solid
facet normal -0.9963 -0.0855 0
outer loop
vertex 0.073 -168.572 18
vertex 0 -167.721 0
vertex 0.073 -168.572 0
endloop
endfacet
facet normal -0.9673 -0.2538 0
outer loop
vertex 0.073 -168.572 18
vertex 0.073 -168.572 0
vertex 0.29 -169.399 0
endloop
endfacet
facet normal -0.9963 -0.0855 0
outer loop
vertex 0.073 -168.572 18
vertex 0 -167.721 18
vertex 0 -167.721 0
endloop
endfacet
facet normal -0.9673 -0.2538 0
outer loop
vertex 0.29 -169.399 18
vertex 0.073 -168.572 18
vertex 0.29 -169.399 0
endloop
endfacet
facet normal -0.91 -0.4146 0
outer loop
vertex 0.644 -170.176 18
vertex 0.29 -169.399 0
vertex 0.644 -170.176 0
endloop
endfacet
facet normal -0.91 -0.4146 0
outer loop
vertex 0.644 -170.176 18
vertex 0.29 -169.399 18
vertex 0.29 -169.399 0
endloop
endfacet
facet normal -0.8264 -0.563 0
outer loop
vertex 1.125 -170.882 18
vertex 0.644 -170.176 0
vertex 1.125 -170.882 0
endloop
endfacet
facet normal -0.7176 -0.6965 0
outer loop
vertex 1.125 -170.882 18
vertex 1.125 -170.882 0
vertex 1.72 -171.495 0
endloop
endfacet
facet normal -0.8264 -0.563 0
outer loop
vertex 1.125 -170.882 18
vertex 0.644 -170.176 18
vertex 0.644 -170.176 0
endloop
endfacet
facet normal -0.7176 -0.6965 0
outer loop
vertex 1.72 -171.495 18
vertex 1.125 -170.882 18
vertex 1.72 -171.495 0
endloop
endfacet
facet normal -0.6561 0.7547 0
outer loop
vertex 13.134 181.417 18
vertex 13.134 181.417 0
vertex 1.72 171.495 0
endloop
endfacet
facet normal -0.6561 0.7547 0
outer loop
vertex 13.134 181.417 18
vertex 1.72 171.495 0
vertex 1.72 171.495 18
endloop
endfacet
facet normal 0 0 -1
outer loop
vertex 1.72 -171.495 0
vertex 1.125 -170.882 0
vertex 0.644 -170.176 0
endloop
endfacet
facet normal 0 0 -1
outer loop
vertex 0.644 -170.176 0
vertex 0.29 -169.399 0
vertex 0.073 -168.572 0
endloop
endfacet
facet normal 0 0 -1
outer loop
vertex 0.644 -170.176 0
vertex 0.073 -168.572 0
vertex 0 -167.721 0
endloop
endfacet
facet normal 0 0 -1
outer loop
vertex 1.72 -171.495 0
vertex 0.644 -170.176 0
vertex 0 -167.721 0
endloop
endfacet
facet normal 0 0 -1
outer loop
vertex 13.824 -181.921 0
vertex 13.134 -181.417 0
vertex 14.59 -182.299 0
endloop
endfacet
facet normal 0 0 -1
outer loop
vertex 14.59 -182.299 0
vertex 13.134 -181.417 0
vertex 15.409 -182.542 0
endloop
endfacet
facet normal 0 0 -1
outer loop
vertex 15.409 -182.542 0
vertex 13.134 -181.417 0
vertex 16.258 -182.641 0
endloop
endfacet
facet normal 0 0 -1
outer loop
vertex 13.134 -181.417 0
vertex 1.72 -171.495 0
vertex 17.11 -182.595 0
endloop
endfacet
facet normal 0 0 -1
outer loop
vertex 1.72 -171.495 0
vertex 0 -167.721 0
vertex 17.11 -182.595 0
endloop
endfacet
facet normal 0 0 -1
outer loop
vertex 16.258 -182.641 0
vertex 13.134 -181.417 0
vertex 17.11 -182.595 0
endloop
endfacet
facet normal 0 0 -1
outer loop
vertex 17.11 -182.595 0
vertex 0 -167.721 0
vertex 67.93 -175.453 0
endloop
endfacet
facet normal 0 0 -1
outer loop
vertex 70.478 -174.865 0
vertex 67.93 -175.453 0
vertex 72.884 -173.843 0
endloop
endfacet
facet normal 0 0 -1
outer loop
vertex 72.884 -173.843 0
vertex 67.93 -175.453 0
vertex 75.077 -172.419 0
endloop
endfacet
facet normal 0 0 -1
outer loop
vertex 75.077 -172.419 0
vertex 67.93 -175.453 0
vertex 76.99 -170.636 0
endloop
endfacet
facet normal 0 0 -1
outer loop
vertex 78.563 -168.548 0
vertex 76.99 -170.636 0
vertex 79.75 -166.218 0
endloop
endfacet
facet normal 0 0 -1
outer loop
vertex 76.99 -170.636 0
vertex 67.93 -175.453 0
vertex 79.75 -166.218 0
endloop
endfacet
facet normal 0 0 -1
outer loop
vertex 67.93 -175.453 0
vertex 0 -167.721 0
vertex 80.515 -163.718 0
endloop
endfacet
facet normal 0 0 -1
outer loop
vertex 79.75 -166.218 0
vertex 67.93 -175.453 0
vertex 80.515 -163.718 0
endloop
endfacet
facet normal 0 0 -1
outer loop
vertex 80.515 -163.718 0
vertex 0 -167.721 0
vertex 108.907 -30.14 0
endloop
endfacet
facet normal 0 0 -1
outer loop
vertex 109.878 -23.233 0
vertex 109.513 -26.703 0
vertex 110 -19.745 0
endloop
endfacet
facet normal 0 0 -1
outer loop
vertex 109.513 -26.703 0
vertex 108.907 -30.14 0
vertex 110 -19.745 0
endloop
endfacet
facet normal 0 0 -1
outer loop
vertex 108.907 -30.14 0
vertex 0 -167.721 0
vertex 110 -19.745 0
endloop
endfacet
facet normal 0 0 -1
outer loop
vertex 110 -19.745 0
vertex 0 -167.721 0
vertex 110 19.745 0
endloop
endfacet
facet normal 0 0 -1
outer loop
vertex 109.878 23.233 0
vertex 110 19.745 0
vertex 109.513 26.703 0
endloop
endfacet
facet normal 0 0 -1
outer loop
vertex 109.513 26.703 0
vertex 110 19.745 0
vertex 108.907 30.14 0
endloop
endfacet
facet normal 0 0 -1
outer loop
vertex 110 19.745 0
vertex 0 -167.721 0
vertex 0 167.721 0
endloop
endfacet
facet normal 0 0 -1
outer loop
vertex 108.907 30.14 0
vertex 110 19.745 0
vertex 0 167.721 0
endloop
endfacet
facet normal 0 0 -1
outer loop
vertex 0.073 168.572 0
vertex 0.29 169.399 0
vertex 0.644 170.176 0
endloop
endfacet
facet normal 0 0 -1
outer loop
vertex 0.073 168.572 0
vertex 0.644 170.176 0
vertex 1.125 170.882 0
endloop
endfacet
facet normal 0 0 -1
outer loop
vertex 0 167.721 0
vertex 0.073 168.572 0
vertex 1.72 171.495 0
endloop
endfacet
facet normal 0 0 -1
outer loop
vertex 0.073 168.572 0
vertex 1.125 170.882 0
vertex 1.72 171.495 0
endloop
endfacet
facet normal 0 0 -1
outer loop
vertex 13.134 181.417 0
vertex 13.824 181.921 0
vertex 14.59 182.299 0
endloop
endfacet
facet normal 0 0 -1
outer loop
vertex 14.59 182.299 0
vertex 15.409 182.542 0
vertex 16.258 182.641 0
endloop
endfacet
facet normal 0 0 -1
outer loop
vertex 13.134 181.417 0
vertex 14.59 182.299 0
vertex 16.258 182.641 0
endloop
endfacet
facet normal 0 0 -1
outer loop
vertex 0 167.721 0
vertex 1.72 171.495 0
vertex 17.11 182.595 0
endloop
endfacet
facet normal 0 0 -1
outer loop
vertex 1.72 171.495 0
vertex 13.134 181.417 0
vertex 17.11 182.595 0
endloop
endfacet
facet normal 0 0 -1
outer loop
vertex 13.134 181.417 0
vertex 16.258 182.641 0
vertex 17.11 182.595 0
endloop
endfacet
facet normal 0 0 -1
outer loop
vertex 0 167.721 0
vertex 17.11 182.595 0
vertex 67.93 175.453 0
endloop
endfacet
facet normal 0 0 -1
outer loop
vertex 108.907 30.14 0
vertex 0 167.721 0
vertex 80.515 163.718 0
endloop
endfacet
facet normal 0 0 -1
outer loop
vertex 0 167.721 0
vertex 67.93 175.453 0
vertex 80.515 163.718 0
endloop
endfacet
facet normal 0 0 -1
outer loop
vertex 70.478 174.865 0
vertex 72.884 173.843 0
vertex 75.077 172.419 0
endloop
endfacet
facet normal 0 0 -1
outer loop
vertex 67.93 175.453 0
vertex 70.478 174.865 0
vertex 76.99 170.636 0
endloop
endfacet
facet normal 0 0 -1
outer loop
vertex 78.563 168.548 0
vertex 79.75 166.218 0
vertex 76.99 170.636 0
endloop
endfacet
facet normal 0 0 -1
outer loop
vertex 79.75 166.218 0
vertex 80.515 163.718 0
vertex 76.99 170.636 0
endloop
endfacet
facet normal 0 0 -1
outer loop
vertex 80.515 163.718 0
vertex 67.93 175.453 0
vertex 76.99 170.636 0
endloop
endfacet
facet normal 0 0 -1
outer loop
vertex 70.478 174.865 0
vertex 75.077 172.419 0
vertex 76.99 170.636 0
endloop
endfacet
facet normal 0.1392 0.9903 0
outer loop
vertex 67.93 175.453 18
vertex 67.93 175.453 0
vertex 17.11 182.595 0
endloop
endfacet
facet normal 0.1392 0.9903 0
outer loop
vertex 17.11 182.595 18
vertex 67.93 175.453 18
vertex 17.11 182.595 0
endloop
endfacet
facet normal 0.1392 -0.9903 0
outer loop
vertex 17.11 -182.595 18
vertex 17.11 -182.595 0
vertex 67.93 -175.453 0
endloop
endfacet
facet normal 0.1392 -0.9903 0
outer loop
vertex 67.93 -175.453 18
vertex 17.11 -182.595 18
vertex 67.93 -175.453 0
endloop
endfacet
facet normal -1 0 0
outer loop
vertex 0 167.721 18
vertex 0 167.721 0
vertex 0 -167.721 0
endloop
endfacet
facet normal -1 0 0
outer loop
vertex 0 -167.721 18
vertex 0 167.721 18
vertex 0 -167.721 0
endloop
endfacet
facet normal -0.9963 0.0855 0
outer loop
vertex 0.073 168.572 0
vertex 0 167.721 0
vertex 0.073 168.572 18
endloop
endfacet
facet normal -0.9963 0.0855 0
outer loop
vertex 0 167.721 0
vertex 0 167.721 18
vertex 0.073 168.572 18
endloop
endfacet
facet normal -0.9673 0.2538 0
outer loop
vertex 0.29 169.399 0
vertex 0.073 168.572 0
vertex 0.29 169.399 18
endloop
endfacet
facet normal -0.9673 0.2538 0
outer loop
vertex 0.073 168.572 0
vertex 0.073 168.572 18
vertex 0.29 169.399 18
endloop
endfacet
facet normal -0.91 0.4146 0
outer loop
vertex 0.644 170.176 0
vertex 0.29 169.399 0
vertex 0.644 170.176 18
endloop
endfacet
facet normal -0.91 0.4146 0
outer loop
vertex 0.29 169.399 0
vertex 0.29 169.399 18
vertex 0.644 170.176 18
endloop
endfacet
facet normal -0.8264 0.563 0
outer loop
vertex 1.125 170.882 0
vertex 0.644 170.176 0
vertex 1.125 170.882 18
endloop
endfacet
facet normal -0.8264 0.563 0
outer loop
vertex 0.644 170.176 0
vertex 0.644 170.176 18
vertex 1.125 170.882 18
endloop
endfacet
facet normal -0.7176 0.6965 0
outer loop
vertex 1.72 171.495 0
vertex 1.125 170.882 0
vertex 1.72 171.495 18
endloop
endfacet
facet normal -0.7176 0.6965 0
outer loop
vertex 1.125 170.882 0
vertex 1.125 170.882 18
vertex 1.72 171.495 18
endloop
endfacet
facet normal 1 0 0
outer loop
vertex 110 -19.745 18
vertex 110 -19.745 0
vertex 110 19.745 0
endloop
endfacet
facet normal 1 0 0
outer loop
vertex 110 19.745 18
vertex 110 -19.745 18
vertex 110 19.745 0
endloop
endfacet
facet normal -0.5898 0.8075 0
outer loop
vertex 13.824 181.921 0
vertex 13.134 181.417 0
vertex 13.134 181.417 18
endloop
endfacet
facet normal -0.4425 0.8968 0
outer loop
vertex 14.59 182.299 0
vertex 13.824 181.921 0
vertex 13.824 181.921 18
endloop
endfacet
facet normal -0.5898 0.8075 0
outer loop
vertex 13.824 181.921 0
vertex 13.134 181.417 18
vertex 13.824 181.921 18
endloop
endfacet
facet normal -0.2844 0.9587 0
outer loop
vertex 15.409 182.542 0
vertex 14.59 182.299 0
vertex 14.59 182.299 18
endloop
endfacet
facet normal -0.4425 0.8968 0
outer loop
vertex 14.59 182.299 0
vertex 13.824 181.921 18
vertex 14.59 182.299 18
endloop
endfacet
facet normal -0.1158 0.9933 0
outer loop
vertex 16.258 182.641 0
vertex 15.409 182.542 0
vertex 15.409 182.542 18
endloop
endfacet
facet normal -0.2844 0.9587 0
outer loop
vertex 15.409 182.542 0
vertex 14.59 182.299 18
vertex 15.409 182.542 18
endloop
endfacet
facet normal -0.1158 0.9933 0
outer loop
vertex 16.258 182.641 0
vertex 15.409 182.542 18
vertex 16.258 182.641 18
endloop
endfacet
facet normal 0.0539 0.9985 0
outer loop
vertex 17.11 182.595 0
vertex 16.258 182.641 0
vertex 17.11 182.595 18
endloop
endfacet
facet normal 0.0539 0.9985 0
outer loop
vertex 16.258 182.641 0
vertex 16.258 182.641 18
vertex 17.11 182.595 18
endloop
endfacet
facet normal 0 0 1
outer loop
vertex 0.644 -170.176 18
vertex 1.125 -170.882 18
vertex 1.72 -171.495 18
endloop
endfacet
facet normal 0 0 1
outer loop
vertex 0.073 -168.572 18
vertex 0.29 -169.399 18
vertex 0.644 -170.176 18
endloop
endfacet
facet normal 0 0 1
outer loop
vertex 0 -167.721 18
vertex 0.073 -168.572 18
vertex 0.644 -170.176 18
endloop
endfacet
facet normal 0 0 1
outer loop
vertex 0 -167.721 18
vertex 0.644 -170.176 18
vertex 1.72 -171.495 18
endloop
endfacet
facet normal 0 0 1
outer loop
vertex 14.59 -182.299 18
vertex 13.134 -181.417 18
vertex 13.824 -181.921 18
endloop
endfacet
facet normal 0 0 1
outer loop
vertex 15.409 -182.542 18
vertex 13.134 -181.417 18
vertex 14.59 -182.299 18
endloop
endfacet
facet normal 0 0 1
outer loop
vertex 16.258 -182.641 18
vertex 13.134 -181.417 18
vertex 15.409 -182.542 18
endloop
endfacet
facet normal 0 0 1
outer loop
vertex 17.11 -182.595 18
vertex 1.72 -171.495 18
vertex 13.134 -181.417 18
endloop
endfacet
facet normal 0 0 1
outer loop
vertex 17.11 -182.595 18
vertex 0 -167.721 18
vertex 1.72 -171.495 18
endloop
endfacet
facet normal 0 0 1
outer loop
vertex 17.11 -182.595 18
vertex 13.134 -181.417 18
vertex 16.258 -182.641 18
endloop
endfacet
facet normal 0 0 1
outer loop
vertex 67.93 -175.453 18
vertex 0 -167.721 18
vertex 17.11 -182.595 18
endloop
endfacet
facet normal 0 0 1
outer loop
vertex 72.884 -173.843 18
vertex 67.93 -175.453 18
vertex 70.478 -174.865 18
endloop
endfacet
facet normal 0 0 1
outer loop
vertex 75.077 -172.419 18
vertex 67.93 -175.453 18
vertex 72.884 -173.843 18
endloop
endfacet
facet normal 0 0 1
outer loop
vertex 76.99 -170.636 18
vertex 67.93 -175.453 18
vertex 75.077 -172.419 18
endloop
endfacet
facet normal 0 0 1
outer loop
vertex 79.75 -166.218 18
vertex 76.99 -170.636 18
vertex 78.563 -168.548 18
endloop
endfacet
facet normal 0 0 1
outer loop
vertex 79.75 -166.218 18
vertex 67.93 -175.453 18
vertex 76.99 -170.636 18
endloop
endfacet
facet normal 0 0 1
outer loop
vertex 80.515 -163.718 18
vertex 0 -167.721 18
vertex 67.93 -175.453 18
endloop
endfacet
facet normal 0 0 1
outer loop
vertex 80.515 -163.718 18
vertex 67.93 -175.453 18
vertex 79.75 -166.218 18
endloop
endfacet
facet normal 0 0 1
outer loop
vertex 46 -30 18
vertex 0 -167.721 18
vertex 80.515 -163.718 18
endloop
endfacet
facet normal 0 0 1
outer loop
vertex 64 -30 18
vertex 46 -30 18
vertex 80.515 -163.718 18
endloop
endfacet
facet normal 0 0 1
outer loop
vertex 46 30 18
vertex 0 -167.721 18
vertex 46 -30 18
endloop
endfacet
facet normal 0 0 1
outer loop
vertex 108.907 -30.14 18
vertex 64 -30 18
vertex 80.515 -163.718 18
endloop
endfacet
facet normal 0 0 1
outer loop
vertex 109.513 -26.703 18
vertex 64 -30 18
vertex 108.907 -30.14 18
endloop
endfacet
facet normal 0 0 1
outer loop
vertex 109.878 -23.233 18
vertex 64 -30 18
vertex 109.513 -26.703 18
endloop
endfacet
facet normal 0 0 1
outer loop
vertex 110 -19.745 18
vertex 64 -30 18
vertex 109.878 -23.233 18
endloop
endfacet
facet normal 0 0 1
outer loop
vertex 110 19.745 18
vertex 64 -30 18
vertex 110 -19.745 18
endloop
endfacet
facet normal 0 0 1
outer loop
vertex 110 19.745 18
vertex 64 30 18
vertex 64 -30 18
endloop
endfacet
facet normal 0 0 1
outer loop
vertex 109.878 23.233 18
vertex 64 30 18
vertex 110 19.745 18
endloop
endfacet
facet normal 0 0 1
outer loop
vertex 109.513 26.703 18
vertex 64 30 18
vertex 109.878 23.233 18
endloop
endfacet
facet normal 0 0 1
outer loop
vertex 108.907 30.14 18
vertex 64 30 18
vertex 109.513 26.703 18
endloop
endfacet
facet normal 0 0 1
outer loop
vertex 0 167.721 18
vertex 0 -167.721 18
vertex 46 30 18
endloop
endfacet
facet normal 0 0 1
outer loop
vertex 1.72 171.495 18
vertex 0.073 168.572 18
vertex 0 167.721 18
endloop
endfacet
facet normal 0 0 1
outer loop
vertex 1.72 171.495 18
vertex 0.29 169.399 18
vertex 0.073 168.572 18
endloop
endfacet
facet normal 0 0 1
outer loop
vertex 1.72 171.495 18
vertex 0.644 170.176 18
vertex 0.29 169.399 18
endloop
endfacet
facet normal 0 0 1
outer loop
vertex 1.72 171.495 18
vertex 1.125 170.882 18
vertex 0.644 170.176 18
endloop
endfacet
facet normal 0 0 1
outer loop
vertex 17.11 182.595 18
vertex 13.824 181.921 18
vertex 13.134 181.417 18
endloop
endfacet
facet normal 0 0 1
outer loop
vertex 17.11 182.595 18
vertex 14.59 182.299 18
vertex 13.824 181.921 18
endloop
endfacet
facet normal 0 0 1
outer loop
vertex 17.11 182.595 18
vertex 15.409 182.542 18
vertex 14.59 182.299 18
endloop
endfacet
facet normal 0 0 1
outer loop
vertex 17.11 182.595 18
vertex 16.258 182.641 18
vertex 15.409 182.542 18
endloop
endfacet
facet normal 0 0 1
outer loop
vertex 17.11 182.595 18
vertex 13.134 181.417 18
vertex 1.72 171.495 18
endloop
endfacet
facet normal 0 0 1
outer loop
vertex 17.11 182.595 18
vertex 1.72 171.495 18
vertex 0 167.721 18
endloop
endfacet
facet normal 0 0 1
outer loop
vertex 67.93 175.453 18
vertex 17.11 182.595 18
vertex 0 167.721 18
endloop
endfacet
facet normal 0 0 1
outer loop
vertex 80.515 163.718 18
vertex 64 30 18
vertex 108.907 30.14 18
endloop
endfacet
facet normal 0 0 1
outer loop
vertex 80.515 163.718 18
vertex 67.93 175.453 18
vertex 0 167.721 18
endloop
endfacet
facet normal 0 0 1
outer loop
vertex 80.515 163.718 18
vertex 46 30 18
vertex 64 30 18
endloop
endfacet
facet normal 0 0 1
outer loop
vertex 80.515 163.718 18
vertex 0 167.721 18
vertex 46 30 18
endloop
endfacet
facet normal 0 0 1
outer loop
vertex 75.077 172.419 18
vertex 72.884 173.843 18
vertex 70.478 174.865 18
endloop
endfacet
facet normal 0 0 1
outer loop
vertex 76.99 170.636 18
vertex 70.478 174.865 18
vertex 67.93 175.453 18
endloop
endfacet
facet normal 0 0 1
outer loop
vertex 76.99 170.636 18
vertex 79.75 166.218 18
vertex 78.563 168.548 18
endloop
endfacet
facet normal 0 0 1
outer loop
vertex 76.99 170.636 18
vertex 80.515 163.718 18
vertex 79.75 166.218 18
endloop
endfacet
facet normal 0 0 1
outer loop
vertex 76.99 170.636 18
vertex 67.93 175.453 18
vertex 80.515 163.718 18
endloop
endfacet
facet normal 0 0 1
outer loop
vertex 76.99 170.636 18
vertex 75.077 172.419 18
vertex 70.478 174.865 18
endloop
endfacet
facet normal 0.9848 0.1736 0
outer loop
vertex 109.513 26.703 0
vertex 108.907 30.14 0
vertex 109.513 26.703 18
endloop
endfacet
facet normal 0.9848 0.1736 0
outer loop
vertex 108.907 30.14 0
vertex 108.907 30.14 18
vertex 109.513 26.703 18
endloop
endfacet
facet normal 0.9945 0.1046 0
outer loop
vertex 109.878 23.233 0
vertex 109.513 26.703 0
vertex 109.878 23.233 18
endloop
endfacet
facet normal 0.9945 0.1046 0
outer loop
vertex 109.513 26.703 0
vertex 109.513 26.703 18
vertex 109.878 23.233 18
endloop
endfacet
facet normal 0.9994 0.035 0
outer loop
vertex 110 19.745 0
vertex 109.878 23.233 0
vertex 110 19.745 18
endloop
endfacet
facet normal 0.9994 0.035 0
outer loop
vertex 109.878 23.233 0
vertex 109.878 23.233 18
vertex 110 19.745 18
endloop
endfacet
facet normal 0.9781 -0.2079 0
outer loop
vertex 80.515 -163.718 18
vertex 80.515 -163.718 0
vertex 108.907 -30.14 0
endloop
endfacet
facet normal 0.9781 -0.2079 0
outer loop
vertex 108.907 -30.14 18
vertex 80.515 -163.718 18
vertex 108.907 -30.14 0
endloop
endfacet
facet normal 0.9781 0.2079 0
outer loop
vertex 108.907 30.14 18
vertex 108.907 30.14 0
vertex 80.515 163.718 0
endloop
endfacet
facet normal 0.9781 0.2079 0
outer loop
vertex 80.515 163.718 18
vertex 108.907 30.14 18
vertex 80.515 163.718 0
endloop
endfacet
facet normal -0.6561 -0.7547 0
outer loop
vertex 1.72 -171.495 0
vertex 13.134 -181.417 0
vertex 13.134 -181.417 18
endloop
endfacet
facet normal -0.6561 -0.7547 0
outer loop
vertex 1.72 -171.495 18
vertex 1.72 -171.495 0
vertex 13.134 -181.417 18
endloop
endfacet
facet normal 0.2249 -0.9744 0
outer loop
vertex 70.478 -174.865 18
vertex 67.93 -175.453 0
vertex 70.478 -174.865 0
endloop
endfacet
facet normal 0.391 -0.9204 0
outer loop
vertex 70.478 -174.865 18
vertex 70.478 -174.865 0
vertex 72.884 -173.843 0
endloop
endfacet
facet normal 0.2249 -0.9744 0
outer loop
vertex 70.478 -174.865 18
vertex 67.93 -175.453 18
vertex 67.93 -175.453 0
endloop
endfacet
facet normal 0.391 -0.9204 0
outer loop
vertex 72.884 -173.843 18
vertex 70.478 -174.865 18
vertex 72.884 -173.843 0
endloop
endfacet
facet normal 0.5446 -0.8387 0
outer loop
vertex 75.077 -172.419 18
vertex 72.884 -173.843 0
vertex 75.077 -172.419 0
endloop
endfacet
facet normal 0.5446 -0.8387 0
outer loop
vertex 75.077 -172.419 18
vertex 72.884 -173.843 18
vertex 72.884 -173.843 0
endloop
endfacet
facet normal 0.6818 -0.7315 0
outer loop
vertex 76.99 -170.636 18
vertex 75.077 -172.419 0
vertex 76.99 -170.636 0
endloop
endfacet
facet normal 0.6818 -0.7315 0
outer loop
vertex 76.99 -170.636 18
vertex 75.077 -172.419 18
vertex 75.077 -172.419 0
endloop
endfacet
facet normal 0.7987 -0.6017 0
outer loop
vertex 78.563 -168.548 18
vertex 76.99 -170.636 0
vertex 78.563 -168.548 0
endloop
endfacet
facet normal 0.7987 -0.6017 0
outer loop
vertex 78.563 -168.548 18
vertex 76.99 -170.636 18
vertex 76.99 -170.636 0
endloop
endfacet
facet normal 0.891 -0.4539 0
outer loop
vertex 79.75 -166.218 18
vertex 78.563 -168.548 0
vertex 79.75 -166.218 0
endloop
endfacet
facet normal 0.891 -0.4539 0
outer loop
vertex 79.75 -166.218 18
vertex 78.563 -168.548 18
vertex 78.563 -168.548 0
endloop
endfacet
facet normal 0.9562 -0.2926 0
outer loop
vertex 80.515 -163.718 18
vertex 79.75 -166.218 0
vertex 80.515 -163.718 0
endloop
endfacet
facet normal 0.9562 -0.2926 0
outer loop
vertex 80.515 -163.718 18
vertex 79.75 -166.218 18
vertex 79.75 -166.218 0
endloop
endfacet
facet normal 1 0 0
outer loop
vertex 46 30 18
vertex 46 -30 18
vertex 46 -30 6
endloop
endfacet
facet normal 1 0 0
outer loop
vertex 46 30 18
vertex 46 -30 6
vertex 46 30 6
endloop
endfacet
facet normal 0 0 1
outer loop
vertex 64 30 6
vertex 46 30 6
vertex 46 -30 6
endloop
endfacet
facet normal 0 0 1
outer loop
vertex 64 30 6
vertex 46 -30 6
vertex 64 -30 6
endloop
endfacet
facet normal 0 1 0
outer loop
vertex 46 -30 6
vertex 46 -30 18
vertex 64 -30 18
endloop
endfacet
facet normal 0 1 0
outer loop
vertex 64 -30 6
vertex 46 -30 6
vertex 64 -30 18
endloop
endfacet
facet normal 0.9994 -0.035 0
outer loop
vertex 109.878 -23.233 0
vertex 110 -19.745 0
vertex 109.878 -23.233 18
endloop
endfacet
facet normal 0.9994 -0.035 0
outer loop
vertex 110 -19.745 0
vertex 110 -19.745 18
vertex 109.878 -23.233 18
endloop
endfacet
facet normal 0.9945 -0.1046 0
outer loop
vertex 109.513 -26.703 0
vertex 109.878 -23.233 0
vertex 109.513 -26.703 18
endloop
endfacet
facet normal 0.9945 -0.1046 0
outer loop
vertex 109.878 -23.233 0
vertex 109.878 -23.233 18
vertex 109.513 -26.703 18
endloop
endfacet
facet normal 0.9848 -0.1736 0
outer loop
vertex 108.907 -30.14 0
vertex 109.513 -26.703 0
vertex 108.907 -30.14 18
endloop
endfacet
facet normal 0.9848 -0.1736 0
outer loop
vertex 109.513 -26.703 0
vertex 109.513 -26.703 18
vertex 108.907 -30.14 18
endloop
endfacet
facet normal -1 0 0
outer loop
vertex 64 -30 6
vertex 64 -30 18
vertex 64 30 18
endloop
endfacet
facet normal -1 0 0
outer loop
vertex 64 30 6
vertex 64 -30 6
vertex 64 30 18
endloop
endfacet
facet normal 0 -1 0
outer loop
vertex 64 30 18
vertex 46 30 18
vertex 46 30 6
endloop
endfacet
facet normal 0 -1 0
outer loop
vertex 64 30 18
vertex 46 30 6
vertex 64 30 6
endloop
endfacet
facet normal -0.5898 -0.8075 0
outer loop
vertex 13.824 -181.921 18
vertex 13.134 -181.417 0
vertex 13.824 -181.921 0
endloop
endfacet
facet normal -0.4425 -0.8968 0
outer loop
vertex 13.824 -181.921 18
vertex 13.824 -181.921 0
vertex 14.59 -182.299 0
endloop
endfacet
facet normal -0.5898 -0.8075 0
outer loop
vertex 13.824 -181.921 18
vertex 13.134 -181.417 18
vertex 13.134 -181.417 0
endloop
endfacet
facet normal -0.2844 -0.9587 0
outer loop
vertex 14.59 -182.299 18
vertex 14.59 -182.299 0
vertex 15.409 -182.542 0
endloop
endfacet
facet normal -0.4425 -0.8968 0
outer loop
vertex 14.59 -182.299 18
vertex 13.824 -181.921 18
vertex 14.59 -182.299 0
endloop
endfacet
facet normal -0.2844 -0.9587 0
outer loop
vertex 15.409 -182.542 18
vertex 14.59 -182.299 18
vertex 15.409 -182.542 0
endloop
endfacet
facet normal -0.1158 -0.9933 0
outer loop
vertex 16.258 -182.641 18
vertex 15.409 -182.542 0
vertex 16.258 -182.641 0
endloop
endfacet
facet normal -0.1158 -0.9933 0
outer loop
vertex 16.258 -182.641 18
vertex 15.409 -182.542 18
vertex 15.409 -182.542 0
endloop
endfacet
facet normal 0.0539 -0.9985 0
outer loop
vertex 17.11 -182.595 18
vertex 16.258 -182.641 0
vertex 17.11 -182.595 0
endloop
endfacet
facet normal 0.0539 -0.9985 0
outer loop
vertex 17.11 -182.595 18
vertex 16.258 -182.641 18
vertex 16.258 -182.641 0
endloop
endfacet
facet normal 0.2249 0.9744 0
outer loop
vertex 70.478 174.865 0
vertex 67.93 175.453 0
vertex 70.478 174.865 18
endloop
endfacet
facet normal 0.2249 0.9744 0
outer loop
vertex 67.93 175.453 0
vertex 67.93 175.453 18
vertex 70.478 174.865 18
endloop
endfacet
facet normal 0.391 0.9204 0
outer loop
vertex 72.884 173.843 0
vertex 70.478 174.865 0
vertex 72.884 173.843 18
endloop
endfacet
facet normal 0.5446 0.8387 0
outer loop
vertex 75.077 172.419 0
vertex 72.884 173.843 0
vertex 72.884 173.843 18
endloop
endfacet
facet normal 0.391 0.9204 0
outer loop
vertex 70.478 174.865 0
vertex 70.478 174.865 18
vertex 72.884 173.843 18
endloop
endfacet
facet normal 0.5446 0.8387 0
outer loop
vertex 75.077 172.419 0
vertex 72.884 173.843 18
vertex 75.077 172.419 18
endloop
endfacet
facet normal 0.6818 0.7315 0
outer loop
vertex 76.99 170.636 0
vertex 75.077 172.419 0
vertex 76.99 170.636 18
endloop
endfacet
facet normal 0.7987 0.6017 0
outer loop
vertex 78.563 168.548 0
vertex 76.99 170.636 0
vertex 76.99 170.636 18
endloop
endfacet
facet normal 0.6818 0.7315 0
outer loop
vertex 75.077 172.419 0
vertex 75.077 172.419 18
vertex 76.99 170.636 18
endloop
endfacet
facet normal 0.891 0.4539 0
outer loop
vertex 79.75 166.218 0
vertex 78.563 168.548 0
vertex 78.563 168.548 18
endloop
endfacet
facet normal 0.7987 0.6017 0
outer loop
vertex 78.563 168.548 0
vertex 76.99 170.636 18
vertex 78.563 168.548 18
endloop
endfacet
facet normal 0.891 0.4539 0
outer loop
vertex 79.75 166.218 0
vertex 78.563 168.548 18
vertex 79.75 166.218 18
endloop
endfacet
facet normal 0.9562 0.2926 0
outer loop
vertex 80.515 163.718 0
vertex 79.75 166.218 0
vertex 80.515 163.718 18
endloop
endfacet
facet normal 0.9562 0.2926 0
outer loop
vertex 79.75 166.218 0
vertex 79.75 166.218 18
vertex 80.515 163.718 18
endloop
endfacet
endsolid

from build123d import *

# Parameters (mm, degrees)
PAD_DEPTH    = 18
SKETCH001_W  = 18
SKETCH001_H  = 60
POCKET_DEPTH = 12
CHAMFER_SIZE = 15
FILLET_R     = 5
FILLET001_R  = 15
FILLET002_R  = 50


with BuildPart() as part:
    # Sketch → Pad (new body)
    with BuildSketch(Plane.XY):
        Polygon((0, 185), (0, -185), (78.33092, -173.991307), (110, -25), (110, 25), (78.33092, 173.991307), align=None)
    extrude(amount=PAD_DEPTH)

    # Sketch001 → Pocket (cut)
    with BuildSketch(Plane.XY.offset(18)):
        with Locations((55, 0)):
            Rectangle(SKETCH001_W, SKETCH001_H)
    extrude(amount=-POCKET_DEPTH, mode=Mode.SUBTRACT)

    # Chamfer
    chamfer_edges = [part.edges().sort_by_distance(p)[0] for p in [
        (0, -185, 9),
        (0, 185, 9),
    ]]
    chamfer(chamfer_edges, length=CHAMFER_SIZE)

    # Fillet
    fillet_edges = [part.edges().sort_by_distance(p)[0] for p in [
        (14.854021, 182.912403, 9),
        (0, 170, 9),
        (0, -170, 9),
        (14.854021, -182.912403, 9),
    ]]
    fillet(fillet_edges, radius=FILLET_R)

    # Fillet001
    fillet001_edges = [part.edges().sort_by_distance(p)[0] for p in [
        (78.33092, -173.991307, 9),
        (78.33092, 173.991307, 9),
    ]]
    fillet(fillet001_edges, radius=FILLET001_R)

    # Fillet002
    fillet002_edges = [part.edges().sort_by_distance(p)[0] for p in [
        (110, -25, 9),
        (110, 25, 9),
    ]]
    fillet(fillet002_edges, radius=FILLET002_R)


solid = part.part
